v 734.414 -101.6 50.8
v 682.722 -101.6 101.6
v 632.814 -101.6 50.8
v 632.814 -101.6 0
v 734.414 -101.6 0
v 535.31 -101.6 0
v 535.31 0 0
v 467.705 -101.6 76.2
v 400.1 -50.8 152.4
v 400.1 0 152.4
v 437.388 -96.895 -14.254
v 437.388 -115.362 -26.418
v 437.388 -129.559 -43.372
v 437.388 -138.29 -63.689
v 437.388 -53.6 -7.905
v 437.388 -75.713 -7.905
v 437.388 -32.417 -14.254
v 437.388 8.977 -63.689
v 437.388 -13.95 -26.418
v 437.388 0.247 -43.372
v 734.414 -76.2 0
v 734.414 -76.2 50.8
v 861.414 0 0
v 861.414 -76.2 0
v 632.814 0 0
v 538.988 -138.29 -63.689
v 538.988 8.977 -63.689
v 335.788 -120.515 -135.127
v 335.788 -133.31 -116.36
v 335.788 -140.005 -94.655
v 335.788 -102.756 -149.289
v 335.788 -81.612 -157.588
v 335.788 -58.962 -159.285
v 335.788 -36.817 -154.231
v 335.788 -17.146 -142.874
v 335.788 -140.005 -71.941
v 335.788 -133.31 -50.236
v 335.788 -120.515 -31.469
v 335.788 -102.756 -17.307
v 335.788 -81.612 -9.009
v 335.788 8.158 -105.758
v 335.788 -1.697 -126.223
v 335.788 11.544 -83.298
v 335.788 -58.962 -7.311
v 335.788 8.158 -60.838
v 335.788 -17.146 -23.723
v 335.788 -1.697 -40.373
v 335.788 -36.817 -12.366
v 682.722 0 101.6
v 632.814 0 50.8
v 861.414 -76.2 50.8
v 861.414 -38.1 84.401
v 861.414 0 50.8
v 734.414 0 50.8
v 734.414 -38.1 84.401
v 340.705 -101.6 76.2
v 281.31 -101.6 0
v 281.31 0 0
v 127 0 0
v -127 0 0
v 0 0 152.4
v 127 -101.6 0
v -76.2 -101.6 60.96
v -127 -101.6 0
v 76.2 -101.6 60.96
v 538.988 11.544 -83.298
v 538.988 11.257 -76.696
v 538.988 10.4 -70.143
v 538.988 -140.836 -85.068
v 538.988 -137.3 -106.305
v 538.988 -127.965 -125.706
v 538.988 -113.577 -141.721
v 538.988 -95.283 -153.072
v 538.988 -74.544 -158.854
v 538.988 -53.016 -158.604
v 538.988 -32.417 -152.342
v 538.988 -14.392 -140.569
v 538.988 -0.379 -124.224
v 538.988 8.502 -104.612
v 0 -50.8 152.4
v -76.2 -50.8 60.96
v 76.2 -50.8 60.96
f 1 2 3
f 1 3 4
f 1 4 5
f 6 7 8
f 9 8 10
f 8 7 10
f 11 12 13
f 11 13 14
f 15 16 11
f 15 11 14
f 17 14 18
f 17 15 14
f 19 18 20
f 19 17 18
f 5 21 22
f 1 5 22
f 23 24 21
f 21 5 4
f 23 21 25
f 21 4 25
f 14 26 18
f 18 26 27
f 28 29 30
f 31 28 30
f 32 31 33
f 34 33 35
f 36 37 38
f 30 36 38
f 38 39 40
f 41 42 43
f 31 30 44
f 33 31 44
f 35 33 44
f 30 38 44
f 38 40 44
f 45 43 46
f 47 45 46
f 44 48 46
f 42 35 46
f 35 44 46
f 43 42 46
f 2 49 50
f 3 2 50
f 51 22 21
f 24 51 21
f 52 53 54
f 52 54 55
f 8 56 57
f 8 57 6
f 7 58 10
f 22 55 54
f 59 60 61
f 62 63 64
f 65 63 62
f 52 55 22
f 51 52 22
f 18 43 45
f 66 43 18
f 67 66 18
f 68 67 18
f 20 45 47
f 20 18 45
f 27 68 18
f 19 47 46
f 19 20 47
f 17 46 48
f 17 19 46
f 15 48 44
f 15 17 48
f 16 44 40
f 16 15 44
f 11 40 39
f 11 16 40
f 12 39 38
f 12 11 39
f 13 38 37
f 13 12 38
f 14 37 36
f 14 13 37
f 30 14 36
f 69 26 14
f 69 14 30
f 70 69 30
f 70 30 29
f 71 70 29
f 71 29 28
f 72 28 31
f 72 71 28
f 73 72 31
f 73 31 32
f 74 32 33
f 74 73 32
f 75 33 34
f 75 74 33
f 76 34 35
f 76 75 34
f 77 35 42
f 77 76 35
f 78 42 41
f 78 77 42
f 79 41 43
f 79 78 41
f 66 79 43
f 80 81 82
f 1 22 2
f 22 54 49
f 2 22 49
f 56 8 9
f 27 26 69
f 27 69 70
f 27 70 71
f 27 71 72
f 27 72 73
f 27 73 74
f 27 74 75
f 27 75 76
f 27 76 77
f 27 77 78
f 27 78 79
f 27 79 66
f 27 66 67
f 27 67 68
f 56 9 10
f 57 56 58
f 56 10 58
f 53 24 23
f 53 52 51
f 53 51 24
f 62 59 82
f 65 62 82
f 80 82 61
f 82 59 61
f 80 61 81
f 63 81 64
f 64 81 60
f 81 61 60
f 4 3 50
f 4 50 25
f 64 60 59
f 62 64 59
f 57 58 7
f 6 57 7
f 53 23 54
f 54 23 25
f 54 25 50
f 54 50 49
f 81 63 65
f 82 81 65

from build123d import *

# Parameters (mm, degrees)
F1_DEPTH  = 101.6
F3_DEPTH  = 50.8
F5_DEPTH  = 101.6
F8_DEPTH  = 241.3
F10_DEPTH = 101.6
F12_DEPTH = 127
F13_R     = 76.2
F14_DEPTH = 203.2
F16_DEPTH = 101.6


with BuildPart() as f1:
    # F0 (on Front) → F1 (new body)
    with BuildSketch(Plane.XZ):
        Polygon((0, 152.4), (-127, 0), (127, 0), align=None)
    extrude(amount=F1_DEPTH)

    # F2 (on face) → F3 (cut)
    with BuildSketch(Plane.XZ.offset(101.6)):
        Polygon((0, 152.4), (-76.2, 60.96), (76.2, 60.96), align=None)
    extrude(amount=-F3_DEPTH, mode=Mode.SUBTRACT)


with BuildPart() as f5:
    # F4 (on Front) → F5 (new body)
    with BuildSketch(Plane.XZ):
        Polygon((400.1002013683, 152.4), (281.3098678292, 0), (535.3098678292, 0), align=None)
    extrude(amount=F5_DEPTH)

    # F7 (on offset) → F8 (cut)
    with BuildSketch(Plane.YZ.offset(538.988)):
        Polygon((-101.6, 152.4), (-101.6, 76.2), (-50.8, 152.4), align=None)
    extrude(amount=-F8_DEPTH, mode=Mode.SUBTRACT)


with BuildPart() as f10:
    # F9 (on Front) → F10 (new body)
    with BuildSketch(Plane.XZ):
        Polygon((682.7224542772, 101.6), (632.8136901141, 50.8), (632.8136901141, 0), (734.4136901141, 0), (734.4136901141, 50.8), align=None)
    extrude(amount=F10_DEPTH)

    # F11 (on face) → F12 (join)
    with BuildSketch(Plane.YZ.offset(734.4136901141)):
        Polygon((-76.2, 0), (0, 0), (0, 50.8), (-38.1, 84.4010416505), (-76.2, 50.8), align=None)
    extrude(amount=F12_DEPTH)


with BuildPart() as f14:
    # F13 (on offset) → F14 (new body)
    with BuildSketch(Plane.YZ.offset(538.988)):
        with Locations((-64.6563246846, -83.2981318235)):
            Circle(F13_R)
    extrude(amount=-F14_DEPTH)

    # F15 (on face) → F16 (cut)
    with BuildSketch(Plane.YZ.offset(538.988)):
        with BuildLine():
            ThreePointArc((8.9774310058, -63.6892047005), (-64.6563246846, -7.0981318235), (-138.2900803751, -63.6892047005))
            Line((-138.2900803751, -63.6892047005), (8.9774310058, -63.6892047005))
        make_face()
    extrude(amount=-F16_DEPTH, mode=Mode.SUBTRACT)


solid = Compound([f1.part, f5.part, f10.part, f14.part])
